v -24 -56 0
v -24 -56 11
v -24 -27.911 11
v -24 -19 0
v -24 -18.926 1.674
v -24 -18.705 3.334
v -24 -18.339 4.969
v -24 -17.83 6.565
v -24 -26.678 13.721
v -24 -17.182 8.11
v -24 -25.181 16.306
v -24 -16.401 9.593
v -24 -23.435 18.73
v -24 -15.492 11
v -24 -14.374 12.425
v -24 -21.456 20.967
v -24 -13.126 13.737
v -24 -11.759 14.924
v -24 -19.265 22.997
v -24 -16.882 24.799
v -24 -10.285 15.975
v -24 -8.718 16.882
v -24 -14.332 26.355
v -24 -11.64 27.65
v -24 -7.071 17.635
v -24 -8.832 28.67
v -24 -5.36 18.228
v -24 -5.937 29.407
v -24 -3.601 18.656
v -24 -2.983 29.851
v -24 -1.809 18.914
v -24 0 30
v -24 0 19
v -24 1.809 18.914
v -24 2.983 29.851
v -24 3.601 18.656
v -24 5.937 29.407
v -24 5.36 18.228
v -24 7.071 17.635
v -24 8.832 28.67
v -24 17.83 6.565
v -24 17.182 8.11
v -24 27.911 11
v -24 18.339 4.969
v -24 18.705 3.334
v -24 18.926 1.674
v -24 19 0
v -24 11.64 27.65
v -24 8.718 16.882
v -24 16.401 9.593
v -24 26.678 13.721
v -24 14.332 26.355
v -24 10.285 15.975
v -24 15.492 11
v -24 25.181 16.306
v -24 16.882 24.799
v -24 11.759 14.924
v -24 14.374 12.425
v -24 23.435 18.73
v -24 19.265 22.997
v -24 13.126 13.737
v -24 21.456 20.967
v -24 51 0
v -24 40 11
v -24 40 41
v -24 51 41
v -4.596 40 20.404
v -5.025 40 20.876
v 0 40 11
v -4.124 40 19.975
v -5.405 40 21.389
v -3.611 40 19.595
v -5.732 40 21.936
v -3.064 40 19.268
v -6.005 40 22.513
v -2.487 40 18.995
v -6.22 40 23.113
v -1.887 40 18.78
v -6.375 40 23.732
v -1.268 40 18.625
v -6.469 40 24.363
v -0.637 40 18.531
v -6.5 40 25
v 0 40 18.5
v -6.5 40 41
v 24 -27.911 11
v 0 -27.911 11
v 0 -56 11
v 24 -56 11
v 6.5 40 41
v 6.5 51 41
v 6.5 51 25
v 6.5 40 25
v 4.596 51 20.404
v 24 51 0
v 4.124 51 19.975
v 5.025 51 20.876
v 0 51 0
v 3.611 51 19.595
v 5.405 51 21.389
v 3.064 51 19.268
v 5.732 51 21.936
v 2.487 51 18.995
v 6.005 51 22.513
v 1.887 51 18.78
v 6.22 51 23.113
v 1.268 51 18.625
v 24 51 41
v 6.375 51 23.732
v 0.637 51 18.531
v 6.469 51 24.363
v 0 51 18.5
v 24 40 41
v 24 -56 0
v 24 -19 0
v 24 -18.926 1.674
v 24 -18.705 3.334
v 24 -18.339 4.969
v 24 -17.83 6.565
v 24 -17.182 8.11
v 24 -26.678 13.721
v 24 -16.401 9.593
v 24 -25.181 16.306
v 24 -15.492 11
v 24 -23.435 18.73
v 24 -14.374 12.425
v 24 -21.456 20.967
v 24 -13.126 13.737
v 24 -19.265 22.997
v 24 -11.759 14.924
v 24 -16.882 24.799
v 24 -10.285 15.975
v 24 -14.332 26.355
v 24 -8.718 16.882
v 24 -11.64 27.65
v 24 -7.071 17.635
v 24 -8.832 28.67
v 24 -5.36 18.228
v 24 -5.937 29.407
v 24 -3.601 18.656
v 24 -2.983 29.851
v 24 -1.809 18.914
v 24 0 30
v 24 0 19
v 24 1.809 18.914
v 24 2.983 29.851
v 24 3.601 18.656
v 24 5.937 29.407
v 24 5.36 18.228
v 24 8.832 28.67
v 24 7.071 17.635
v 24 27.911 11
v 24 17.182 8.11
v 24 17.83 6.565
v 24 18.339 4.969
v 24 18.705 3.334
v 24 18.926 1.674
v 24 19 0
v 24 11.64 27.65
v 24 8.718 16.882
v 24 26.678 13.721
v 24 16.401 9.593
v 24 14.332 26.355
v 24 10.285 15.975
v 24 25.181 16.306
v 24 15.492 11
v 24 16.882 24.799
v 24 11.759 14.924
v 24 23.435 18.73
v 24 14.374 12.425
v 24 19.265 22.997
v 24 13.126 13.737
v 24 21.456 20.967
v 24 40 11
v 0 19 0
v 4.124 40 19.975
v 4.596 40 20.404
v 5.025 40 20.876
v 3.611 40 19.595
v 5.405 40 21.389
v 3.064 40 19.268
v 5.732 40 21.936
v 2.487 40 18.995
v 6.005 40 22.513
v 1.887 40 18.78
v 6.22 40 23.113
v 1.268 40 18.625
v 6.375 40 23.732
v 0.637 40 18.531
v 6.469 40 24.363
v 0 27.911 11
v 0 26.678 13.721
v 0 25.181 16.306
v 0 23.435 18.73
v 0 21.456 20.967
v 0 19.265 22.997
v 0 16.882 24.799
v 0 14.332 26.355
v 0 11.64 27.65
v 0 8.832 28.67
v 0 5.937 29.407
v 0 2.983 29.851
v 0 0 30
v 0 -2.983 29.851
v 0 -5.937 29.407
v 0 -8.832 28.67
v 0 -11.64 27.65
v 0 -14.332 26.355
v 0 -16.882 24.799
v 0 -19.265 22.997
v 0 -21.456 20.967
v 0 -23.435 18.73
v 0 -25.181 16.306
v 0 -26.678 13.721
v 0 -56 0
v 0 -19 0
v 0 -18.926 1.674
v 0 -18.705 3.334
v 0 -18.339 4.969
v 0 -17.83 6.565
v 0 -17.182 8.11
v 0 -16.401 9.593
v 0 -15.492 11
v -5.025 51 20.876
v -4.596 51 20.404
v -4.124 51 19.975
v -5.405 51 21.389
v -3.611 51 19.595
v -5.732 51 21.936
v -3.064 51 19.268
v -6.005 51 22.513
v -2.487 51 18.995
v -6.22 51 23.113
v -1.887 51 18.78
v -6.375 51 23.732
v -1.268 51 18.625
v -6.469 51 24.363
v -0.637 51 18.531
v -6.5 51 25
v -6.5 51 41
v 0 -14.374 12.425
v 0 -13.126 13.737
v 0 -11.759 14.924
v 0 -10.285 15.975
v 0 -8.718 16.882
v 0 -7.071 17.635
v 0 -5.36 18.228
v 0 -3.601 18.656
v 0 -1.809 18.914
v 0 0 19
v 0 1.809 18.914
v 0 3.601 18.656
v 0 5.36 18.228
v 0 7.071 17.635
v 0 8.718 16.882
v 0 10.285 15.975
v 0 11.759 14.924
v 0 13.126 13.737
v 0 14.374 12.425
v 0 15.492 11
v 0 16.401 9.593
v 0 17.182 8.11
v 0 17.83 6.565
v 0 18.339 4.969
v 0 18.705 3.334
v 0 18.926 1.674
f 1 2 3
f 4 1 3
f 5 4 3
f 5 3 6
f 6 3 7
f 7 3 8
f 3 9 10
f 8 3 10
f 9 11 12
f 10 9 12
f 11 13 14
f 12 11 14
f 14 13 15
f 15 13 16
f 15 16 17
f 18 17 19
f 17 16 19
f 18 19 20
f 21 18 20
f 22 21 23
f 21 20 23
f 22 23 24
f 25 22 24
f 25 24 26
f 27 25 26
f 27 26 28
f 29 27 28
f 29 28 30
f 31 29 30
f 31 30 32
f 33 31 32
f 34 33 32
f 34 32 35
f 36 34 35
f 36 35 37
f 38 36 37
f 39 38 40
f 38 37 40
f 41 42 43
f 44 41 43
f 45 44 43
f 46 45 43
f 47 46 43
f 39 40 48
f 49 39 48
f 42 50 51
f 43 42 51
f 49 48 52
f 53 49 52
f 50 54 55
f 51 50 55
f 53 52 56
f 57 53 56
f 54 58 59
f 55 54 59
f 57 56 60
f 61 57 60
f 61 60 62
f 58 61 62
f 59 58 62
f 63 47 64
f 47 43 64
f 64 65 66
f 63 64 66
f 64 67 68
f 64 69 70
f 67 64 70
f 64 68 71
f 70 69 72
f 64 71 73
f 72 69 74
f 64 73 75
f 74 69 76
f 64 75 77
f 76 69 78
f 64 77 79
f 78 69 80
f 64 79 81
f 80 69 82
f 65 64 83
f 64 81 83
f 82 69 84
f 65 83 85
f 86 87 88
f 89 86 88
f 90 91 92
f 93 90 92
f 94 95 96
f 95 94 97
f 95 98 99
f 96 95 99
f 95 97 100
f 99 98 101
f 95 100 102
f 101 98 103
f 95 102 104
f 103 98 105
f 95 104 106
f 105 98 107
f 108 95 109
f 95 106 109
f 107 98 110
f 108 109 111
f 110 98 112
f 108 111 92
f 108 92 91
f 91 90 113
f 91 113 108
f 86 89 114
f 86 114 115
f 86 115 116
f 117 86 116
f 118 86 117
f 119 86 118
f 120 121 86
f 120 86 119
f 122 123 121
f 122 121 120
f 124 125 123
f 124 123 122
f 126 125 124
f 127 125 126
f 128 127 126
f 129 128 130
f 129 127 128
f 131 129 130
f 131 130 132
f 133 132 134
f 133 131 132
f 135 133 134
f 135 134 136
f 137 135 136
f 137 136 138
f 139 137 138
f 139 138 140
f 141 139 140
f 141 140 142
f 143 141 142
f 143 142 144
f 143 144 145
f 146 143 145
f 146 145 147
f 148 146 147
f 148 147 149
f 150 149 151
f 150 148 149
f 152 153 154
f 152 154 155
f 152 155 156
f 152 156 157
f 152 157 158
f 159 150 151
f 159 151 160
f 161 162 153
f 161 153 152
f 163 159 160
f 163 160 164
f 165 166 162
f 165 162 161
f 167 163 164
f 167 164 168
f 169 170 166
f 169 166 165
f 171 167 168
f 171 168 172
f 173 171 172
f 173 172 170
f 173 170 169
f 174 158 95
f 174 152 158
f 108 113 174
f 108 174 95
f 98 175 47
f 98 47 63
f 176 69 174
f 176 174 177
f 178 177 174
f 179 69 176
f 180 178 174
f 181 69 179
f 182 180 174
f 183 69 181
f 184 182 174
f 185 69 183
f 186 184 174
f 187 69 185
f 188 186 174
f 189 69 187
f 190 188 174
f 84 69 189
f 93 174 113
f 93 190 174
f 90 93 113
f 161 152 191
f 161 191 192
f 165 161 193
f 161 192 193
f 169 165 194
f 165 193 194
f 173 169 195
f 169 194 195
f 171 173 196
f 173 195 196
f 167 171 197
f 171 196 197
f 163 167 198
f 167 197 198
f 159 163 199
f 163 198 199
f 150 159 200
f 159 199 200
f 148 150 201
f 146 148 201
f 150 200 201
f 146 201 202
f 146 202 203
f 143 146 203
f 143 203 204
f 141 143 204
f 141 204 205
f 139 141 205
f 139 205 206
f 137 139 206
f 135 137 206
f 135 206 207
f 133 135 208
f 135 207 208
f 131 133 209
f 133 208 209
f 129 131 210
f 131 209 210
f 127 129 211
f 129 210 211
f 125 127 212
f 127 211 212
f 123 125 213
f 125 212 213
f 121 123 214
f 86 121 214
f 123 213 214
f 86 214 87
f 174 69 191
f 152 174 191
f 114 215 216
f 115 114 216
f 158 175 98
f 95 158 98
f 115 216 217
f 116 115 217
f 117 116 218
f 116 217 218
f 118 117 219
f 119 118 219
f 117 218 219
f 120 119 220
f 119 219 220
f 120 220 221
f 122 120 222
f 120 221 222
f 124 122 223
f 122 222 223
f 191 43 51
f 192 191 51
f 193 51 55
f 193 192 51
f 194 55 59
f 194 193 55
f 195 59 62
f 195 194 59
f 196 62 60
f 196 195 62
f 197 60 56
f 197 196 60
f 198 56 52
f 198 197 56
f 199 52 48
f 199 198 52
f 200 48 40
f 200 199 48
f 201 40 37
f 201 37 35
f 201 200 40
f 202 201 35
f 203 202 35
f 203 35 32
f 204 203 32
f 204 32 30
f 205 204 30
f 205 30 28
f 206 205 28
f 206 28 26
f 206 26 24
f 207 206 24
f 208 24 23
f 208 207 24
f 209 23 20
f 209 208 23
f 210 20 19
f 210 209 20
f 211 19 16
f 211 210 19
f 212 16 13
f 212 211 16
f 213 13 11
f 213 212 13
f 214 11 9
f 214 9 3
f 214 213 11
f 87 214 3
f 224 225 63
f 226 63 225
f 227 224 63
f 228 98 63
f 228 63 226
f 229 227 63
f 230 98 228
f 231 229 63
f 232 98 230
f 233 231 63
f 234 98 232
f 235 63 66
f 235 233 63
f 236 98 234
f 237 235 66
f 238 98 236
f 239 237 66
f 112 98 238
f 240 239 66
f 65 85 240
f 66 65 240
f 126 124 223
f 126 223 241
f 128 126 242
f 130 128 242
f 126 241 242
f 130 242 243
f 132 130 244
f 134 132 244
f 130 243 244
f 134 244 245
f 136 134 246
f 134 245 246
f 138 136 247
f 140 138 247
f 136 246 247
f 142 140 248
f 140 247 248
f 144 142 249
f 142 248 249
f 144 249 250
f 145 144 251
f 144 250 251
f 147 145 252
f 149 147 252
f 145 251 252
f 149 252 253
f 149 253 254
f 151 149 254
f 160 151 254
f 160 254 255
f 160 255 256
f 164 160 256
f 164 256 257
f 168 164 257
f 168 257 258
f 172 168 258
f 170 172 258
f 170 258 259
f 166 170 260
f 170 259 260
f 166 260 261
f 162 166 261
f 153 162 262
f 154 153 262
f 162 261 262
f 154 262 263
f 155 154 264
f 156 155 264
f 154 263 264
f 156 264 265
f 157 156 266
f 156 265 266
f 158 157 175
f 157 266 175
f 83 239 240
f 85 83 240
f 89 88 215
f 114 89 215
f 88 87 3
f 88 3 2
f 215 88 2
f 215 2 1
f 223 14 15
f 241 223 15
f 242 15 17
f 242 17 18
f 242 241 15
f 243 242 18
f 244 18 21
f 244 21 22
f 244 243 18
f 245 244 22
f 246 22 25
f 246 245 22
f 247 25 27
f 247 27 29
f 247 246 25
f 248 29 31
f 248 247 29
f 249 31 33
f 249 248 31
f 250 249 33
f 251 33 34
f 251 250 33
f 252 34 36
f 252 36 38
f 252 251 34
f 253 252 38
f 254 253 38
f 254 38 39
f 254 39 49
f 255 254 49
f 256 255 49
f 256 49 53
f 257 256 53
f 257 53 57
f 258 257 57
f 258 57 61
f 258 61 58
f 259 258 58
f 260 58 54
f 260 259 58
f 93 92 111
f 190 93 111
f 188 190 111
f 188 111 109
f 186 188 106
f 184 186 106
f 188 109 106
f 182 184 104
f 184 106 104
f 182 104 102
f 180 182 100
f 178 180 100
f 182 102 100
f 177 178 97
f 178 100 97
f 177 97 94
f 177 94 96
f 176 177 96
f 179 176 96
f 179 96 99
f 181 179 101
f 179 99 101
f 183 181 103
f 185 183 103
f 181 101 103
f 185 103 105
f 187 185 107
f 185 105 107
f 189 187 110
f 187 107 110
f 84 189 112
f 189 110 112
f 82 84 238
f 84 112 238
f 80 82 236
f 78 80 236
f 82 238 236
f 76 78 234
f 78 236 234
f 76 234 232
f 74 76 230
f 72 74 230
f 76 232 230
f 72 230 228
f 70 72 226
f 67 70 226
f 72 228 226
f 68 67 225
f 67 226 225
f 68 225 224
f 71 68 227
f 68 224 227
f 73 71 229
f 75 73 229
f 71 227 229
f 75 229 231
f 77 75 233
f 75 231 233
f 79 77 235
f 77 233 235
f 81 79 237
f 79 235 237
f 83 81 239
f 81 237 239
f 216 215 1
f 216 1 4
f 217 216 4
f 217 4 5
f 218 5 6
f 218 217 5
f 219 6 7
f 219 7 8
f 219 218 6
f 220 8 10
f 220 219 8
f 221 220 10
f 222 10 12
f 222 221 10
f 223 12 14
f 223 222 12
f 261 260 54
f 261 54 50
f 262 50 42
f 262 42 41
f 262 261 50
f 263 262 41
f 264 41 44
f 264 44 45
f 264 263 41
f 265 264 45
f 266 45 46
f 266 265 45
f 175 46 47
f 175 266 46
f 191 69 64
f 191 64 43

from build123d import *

# Parameters (mm, degrees)
F0_W     = 11
F0_H     = 30
F1_DEPTH = 24
F3_DEPTH = 11


# Not quite as in the source:
# - a feature of the source that left no trace in its solid (it failed there, or was rolled back) is left out


with BuildPart() as f1:
    # F0 (on Right) → F1 (new body, symmetric)
    with BuildSketch(Plane.YZ):
        with BuildLine():
            ThreePointArc((15.4919333848, 11), (18.1017503893, 5.7729223833), (19, 0))
            Line((19, 0), (30, 0))
            ThreePointArc((30, 0), (29.4730143031, 5.5983415304), (27.9105714739, 11))
            Line((27.9105714739, 11), (15.4919333848, 11))
        make_face()
        with BuildLine():
            ThreePointArc((-15.4919333848, 11), (0, 19), (15.4919333848, 11))
            Line((15.4919333848, 11), (27.9105714739, 11))
            ThreePointArc((27.9105714739, 11), (0, 30), (-27.9105714739, 11))
            Line((-27.9105714739, 11), (-15.4919333848, 11))
        make_face()
        with BuildLine():
            Line((-30, 0), (-19, 0))
            ThreePointArc((-19, 0), (-18.1017503893, 5.7729223833), (-15.4919333848, 11))
            Line((-15.4919333848, 11), (-27.9105714739, 11))
            ThreePointArc((-27.9105714739, 11), (-29.4730143031, 5.5983415304), (-30, 0))
        make_face()
        with BuildLine():
            ThreePointArc((27.9105714739, 11), (29.4730143031, 5.5983415304), (30, 0))
            Line((30, 0), (51, 0))
            Line((51, 0), (51, 11))
            Line((51, 11), (40, 11))
            Line((40, 11), (27.9105714739, 11))
        make_face()
        with BuildLine():
            Line((-56, 0), (-30, 0))
            ThreePointArc((-30, 0), (-29.4730143031, 5.5983415304), (-27.9105714739, 11))
            Line((-27.9105714739, 11), (-56, 11))
            Line((-56, 11), (-56, 0))
        make_face()
        with Locations((45.5, 26)):
            Rectangle(F0_W, F0_H)
    extrude(amount=F1_DEPTH, both=True)

    # F2 (on face) → F3 (cut, through all)
    with BuildSketch(Plane(origin=(0, 51, 0), x_dir=(-1, 0, 0), z_dir=(0, 1, 0))):
        with BuildLine():
            ThreePointArc((-6.5, 25), (0, 18.5), (6.5, 25))
            ThreePointArc((6.5, 25), (0, 31.5), (-6.5, 25))
        make_face()
        with BuildLine():
            ThreePointArc((-6.5, 25), (0, 31.5), (6.5, 25))
            Line((6.5, 25), (6.5, 41))
            Line((6.5, 41), (-6.5, 41))
            Line((-6.5, 41), (-6.5, 25))
        make_face()
    extrude(amount=-F3_DEPTH, mode=Mode.SUBTRACT)


solid = f1.part
